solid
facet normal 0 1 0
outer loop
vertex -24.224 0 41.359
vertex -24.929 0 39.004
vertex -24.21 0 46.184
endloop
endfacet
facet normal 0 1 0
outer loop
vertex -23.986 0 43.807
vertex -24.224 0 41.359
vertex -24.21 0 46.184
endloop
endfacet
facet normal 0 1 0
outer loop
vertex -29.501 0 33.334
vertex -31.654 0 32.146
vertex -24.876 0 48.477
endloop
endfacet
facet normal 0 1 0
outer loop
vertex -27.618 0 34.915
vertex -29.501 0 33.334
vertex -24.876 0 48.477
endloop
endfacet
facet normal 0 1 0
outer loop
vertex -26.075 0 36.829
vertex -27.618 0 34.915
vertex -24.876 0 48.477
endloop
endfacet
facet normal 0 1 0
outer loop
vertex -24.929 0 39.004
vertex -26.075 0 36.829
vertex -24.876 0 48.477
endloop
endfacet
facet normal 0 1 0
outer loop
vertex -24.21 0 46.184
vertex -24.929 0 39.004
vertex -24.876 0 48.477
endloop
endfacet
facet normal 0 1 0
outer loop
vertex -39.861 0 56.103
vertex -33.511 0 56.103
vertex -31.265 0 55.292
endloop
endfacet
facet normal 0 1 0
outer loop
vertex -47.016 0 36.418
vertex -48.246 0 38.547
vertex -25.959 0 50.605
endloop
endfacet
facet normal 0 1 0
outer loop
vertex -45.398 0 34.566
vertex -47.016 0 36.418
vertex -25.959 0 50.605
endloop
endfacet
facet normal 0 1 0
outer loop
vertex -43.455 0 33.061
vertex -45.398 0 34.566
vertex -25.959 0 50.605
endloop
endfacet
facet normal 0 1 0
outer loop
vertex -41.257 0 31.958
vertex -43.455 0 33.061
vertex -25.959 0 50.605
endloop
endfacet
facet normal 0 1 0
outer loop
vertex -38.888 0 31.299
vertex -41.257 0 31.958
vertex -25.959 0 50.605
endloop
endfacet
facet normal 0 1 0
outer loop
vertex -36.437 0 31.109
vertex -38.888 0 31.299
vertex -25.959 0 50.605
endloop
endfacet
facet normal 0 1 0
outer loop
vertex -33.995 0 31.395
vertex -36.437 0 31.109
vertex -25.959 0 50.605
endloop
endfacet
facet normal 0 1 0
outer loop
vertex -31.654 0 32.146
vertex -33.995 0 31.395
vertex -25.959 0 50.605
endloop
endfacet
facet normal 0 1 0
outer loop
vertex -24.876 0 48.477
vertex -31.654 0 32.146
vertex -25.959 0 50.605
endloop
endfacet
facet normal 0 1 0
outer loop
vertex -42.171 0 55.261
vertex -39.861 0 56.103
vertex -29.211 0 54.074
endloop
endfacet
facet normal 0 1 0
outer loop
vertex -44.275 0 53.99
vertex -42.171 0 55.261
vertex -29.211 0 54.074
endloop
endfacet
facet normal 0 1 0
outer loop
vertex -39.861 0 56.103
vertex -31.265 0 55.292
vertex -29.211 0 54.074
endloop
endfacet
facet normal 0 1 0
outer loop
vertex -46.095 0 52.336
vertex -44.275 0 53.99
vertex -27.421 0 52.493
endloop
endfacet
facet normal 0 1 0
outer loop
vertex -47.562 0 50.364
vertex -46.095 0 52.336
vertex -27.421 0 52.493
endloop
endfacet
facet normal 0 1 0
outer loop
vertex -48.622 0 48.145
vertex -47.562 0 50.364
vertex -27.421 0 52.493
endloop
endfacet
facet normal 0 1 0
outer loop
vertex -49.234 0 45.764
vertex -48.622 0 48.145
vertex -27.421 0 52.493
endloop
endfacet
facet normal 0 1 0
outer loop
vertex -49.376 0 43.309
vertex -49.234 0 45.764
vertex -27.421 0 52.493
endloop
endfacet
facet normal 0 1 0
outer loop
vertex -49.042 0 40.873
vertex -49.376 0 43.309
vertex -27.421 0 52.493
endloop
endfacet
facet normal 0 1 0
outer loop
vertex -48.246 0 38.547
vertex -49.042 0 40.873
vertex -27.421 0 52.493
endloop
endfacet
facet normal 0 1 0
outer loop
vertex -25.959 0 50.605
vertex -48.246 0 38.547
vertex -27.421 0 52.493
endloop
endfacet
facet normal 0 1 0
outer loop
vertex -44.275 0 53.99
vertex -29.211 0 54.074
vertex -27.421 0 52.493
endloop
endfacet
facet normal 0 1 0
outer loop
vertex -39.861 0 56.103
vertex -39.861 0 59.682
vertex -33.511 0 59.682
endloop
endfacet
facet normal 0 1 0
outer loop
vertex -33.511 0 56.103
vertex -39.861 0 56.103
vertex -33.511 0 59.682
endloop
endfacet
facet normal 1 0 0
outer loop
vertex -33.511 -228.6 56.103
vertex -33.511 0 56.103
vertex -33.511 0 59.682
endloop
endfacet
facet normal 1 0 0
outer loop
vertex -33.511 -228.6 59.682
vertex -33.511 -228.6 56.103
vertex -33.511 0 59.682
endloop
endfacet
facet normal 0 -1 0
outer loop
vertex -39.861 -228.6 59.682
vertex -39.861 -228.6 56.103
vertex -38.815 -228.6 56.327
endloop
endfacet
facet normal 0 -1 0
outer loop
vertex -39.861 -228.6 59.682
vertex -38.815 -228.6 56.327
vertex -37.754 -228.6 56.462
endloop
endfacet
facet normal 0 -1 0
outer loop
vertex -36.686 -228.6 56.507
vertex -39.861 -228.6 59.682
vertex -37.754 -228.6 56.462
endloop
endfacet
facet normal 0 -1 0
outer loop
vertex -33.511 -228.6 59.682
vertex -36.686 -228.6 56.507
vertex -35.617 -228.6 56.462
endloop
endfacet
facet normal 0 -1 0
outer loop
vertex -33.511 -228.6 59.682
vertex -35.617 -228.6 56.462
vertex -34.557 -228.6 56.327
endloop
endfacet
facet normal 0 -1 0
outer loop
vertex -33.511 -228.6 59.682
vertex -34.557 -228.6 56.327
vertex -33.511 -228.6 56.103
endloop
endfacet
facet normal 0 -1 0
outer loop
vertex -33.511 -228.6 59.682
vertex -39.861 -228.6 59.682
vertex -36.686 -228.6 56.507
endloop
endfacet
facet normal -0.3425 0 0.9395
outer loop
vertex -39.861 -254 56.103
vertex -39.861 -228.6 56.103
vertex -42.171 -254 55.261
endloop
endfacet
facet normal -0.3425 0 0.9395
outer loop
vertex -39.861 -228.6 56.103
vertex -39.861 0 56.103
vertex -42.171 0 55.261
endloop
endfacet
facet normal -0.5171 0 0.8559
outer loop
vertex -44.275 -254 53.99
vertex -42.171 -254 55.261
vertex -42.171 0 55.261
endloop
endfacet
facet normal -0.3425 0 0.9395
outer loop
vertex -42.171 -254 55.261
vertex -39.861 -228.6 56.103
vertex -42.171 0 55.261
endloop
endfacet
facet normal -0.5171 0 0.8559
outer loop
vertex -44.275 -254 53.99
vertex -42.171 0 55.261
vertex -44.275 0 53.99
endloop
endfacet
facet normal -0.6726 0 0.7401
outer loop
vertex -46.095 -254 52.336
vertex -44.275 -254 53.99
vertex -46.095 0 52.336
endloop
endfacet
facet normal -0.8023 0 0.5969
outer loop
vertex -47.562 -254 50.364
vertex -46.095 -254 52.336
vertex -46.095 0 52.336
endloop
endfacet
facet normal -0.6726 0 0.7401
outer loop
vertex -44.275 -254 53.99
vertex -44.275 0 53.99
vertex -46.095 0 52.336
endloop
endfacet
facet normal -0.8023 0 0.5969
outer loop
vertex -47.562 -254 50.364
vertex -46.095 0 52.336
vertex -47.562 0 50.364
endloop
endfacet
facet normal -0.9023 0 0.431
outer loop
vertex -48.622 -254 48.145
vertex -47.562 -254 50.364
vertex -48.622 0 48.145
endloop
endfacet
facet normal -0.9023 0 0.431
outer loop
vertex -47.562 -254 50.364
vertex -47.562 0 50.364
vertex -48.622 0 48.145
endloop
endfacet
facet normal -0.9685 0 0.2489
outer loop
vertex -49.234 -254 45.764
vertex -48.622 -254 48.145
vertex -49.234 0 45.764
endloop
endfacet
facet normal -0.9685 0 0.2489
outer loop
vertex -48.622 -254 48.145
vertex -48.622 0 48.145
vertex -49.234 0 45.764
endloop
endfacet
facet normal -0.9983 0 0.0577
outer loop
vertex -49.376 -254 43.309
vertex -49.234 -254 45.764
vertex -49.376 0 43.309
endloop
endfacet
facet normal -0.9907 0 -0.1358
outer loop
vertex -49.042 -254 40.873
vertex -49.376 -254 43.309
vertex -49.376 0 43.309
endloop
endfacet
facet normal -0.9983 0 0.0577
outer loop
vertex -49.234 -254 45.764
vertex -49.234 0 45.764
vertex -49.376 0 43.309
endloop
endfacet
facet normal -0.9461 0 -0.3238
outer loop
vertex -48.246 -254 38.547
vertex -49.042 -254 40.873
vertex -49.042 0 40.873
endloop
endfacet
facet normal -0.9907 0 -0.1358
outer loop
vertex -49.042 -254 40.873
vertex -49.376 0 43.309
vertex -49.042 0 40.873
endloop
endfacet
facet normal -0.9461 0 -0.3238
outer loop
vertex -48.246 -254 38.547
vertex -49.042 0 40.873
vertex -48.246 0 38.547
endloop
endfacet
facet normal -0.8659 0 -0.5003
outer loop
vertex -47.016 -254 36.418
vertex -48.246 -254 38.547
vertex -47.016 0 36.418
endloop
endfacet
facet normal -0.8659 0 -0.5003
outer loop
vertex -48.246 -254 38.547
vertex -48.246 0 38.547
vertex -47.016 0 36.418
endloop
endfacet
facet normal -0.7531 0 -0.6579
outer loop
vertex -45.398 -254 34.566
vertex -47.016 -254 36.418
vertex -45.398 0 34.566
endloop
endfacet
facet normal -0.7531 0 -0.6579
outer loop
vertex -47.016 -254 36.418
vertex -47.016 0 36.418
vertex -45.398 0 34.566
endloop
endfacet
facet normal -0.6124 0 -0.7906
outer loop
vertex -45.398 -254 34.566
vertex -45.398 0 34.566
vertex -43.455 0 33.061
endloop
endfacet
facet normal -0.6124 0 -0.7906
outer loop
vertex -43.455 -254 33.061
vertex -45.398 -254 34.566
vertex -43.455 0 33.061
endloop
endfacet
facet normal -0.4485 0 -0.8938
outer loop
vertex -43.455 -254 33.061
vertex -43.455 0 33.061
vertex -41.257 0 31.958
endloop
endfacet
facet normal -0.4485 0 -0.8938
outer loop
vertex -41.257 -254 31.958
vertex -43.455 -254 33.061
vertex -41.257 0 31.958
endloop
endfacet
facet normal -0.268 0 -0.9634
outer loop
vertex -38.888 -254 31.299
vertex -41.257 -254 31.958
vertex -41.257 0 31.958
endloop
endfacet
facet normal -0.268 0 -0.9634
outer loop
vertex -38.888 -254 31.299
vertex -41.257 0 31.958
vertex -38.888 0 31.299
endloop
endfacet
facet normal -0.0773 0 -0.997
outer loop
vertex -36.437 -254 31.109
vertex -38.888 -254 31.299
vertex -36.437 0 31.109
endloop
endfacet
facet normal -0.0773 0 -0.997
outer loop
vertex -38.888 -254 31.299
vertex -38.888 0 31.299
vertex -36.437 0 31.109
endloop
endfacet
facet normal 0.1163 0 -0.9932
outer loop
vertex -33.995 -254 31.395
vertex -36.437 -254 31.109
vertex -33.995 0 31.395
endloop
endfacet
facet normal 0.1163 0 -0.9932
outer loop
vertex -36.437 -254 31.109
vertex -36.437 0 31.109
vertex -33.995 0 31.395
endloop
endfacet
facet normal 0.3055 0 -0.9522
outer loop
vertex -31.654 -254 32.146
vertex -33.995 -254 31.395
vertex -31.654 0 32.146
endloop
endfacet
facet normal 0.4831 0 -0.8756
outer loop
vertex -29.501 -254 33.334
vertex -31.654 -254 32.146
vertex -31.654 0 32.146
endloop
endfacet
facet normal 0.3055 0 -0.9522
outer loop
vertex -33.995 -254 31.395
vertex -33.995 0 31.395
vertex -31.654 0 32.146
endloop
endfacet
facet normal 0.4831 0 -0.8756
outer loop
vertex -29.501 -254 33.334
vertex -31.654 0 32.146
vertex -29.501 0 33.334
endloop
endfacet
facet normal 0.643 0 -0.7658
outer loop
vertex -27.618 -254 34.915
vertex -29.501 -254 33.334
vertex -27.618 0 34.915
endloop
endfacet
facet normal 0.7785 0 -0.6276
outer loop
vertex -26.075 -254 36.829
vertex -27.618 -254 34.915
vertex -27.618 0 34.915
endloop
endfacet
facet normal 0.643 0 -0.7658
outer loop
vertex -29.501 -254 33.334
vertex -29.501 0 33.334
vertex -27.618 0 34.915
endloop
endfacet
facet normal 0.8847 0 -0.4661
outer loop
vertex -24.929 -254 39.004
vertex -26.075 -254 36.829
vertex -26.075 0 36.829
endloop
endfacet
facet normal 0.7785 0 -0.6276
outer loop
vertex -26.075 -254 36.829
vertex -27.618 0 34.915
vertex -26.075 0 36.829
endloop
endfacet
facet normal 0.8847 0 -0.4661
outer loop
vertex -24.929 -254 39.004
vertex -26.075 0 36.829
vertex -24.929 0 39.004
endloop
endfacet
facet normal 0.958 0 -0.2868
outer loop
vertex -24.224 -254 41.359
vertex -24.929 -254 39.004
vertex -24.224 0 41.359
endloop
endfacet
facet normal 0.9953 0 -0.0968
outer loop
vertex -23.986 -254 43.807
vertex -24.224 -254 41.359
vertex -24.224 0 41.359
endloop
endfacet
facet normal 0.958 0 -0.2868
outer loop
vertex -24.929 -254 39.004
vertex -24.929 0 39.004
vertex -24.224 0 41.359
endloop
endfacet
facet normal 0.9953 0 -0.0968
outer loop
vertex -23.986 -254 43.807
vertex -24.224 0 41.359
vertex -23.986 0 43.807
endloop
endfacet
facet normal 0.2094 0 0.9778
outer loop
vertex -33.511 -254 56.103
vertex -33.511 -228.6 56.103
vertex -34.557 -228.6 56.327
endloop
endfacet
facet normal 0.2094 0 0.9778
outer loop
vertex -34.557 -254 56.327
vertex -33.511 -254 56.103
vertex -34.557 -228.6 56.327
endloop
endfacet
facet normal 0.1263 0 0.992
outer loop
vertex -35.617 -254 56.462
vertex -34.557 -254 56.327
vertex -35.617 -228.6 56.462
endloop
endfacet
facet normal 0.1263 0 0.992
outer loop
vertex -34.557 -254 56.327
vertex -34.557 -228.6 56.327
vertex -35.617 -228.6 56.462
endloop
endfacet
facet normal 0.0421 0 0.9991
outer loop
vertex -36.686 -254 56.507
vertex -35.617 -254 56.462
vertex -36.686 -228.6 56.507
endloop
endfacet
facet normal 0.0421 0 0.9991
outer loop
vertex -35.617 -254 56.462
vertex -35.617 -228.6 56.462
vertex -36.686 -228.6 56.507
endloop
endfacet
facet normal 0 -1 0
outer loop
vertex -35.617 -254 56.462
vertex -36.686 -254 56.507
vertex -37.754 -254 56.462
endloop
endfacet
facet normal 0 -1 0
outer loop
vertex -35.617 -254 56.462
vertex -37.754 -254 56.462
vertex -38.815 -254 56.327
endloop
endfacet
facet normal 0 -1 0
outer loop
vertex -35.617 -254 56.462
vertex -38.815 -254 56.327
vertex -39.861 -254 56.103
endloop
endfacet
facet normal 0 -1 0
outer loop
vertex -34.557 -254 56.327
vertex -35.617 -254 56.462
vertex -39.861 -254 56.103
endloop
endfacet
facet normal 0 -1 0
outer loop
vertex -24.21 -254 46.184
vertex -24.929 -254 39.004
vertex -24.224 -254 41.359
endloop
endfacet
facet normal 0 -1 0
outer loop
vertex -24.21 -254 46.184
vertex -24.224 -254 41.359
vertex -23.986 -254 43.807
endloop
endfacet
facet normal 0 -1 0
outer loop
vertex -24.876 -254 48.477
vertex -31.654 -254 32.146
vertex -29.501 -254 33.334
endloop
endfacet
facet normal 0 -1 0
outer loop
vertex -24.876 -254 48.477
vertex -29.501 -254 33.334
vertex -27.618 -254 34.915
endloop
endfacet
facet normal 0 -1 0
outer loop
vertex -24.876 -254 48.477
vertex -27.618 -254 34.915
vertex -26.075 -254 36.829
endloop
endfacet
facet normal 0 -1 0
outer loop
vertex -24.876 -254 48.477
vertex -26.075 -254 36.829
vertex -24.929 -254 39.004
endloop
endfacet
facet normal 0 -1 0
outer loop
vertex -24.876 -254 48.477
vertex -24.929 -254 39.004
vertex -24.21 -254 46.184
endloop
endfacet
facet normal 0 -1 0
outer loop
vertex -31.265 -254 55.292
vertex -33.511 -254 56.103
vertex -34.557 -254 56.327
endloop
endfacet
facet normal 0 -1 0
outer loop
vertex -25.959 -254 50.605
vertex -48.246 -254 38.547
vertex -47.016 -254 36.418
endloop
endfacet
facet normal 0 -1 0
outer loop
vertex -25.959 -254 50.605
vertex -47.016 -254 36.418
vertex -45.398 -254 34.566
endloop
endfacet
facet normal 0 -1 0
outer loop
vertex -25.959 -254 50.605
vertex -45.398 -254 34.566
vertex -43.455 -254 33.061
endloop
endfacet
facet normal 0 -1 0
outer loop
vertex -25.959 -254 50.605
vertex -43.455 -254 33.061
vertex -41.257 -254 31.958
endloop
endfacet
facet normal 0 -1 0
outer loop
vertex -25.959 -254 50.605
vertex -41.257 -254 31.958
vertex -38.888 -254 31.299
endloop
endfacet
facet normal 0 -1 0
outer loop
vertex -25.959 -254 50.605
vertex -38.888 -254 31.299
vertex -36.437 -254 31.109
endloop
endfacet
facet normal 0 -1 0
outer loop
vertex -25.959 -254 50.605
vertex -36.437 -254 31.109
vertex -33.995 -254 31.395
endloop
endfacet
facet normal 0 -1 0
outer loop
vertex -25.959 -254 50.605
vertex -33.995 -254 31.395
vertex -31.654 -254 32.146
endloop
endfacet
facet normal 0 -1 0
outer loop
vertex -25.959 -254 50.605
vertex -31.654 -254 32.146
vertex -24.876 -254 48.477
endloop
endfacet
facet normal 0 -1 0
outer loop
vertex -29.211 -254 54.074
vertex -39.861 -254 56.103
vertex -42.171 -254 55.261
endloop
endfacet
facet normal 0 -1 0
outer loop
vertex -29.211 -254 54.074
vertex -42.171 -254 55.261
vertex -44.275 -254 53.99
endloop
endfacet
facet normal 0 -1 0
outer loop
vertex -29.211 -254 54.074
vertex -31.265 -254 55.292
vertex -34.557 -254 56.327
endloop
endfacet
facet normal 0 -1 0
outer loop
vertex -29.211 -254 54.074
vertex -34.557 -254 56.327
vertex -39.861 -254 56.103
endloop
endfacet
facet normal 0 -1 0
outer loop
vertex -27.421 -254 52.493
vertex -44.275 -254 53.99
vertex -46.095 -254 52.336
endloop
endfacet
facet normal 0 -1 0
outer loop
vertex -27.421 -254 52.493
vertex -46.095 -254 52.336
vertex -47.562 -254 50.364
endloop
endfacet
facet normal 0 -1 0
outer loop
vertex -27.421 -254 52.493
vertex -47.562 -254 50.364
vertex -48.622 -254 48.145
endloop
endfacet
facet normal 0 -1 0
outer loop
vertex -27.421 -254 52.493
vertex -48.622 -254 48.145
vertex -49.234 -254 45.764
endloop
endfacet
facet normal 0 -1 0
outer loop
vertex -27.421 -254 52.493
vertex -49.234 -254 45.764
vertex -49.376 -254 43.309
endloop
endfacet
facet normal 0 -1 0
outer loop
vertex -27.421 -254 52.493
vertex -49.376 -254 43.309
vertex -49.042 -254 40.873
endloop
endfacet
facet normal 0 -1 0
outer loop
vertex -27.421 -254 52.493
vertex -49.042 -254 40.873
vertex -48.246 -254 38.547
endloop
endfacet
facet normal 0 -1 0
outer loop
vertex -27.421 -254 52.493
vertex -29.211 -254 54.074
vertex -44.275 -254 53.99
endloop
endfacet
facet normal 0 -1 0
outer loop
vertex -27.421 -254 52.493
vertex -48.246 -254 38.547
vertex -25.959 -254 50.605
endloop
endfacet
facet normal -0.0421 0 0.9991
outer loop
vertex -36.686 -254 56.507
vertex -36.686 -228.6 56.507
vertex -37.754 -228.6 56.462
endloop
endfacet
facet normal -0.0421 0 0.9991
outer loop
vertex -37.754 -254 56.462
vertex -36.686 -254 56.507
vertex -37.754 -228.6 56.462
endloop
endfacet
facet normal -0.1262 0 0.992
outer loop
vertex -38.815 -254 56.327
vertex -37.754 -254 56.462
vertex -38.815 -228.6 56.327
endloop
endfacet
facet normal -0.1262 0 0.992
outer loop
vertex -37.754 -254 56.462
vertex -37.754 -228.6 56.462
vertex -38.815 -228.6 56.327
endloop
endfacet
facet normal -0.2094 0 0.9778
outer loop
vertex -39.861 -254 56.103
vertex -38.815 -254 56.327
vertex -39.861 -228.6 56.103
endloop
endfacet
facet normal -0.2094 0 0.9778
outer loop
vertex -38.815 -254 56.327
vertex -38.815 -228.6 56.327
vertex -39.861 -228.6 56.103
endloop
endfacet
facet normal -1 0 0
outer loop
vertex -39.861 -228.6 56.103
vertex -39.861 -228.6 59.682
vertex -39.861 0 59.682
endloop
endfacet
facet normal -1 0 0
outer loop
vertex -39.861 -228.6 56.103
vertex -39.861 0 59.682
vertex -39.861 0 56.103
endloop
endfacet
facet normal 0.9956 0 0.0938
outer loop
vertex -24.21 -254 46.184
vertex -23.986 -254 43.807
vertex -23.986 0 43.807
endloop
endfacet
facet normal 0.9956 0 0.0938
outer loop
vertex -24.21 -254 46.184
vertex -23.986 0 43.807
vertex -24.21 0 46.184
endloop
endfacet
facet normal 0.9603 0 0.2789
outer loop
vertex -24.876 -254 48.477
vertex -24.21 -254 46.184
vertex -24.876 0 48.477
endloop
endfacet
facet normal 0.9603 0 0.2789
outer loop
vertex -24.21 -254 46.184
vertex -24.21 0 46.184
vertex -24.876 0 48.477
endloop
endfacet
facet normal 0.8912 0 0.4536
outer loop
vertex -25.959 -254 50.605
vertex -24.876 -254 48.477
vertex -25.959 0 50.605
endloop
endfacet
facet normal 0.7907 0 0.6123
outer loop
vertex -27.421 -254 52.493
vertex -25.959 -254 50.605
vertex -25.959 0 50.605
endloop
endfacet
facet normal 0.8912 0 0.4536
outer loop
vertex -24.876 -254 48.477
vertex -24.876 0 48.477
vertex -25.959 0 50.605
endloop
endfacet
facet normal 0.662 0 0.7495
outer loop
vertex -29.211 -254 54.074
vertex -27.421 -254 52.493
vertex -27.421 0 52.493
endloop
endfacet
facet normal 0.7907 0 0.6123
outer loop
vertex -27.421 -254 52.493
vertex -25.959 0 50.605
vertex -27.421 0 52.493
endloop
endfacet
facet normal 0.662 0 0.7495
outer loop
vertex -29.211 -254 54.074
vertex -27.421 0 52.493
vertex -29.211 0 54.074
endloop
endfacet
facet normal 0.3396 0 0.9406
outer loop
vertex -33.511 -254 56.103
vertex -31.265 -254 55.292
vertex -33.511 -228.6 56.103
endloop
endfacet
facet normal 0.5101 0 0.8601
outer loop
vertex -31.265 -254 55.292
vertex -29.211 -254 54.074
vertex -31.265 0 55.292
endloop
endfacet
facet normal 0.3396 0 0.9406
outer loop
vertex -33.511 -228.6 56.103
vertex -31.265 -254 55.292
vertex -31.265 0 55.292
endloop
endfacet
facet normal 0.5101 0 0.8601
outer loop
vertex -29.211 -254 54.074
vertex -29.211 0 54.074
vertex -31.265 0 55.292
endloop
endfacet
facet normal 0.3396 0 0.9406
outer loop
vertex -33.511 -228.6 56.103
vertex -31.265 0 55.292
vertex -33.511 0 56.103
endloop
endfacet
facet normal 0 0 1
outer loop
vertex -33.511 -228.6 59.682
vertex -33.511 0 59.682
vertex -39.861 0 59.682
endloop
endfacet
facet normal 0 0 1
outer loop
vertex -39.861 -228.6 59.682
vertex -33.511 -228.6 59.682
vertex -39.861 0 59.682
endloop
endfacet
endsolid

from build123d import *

# Parameters (mm, degrees)
F1_DEPTH = 254
F2_DEPTH = 228.6


with BuildPart() as f1:
    # F0 (on Front) → F1 (new body)
    with BuildSketch(Plane.XZ):
        with BuildLine():
            ThreePointArc((-39.860837, 56.103354), (-44.462967, 33.7664), (-23.985837, 43.806632))
            ThreePointArc((-23.985837, 43.806632), (-26.645606, 51.583762), (-33.510837, 56.103354))
            ThreePointArc((-33.510837, 56.103354), (-35.085583, 56.405409), (-36.685837, 56.506632))
            ThreePointArc((-36.685837, 56.506632), (-38.286092, 56.405409), (-39.860837, 56.103354))
        make_face()
    extrude(amount=F1_DEPTH)

    # F0 (on Front) → F2 (join)
    with BuildSketch(Plane.XZ):
        with BuildLine():
            Line((-39.860837, 59.681632), (-39.860837, 56.103354))
            ThreePointArc((-39.860837, 56.103354), (-38.286092, 56.405409), (-36.685837, 56.506632))
            Line((-36.685837, 56.506632), (-36.685837, 59.681632))
            Line((-36.685837, 59.681632), (-39.860837, 59.681632))
        make_face()
        with BuildLine():
            ThreePointArc((-36.685837, 56.506632), (-35.085583, 56.405409), (-33.510837, 56.103354))
            Line((-33.510837, 56.103354), (-33.510837, 59.681632))
            Line((-33.510837, 59.681632), (-36.685837, 59.681632))
            Line((-36.685837, 59.681632), (-36.685837, 56.506632))
        make_face()
    extrude(amount=F2_DEPTH)


solid = f1.part
